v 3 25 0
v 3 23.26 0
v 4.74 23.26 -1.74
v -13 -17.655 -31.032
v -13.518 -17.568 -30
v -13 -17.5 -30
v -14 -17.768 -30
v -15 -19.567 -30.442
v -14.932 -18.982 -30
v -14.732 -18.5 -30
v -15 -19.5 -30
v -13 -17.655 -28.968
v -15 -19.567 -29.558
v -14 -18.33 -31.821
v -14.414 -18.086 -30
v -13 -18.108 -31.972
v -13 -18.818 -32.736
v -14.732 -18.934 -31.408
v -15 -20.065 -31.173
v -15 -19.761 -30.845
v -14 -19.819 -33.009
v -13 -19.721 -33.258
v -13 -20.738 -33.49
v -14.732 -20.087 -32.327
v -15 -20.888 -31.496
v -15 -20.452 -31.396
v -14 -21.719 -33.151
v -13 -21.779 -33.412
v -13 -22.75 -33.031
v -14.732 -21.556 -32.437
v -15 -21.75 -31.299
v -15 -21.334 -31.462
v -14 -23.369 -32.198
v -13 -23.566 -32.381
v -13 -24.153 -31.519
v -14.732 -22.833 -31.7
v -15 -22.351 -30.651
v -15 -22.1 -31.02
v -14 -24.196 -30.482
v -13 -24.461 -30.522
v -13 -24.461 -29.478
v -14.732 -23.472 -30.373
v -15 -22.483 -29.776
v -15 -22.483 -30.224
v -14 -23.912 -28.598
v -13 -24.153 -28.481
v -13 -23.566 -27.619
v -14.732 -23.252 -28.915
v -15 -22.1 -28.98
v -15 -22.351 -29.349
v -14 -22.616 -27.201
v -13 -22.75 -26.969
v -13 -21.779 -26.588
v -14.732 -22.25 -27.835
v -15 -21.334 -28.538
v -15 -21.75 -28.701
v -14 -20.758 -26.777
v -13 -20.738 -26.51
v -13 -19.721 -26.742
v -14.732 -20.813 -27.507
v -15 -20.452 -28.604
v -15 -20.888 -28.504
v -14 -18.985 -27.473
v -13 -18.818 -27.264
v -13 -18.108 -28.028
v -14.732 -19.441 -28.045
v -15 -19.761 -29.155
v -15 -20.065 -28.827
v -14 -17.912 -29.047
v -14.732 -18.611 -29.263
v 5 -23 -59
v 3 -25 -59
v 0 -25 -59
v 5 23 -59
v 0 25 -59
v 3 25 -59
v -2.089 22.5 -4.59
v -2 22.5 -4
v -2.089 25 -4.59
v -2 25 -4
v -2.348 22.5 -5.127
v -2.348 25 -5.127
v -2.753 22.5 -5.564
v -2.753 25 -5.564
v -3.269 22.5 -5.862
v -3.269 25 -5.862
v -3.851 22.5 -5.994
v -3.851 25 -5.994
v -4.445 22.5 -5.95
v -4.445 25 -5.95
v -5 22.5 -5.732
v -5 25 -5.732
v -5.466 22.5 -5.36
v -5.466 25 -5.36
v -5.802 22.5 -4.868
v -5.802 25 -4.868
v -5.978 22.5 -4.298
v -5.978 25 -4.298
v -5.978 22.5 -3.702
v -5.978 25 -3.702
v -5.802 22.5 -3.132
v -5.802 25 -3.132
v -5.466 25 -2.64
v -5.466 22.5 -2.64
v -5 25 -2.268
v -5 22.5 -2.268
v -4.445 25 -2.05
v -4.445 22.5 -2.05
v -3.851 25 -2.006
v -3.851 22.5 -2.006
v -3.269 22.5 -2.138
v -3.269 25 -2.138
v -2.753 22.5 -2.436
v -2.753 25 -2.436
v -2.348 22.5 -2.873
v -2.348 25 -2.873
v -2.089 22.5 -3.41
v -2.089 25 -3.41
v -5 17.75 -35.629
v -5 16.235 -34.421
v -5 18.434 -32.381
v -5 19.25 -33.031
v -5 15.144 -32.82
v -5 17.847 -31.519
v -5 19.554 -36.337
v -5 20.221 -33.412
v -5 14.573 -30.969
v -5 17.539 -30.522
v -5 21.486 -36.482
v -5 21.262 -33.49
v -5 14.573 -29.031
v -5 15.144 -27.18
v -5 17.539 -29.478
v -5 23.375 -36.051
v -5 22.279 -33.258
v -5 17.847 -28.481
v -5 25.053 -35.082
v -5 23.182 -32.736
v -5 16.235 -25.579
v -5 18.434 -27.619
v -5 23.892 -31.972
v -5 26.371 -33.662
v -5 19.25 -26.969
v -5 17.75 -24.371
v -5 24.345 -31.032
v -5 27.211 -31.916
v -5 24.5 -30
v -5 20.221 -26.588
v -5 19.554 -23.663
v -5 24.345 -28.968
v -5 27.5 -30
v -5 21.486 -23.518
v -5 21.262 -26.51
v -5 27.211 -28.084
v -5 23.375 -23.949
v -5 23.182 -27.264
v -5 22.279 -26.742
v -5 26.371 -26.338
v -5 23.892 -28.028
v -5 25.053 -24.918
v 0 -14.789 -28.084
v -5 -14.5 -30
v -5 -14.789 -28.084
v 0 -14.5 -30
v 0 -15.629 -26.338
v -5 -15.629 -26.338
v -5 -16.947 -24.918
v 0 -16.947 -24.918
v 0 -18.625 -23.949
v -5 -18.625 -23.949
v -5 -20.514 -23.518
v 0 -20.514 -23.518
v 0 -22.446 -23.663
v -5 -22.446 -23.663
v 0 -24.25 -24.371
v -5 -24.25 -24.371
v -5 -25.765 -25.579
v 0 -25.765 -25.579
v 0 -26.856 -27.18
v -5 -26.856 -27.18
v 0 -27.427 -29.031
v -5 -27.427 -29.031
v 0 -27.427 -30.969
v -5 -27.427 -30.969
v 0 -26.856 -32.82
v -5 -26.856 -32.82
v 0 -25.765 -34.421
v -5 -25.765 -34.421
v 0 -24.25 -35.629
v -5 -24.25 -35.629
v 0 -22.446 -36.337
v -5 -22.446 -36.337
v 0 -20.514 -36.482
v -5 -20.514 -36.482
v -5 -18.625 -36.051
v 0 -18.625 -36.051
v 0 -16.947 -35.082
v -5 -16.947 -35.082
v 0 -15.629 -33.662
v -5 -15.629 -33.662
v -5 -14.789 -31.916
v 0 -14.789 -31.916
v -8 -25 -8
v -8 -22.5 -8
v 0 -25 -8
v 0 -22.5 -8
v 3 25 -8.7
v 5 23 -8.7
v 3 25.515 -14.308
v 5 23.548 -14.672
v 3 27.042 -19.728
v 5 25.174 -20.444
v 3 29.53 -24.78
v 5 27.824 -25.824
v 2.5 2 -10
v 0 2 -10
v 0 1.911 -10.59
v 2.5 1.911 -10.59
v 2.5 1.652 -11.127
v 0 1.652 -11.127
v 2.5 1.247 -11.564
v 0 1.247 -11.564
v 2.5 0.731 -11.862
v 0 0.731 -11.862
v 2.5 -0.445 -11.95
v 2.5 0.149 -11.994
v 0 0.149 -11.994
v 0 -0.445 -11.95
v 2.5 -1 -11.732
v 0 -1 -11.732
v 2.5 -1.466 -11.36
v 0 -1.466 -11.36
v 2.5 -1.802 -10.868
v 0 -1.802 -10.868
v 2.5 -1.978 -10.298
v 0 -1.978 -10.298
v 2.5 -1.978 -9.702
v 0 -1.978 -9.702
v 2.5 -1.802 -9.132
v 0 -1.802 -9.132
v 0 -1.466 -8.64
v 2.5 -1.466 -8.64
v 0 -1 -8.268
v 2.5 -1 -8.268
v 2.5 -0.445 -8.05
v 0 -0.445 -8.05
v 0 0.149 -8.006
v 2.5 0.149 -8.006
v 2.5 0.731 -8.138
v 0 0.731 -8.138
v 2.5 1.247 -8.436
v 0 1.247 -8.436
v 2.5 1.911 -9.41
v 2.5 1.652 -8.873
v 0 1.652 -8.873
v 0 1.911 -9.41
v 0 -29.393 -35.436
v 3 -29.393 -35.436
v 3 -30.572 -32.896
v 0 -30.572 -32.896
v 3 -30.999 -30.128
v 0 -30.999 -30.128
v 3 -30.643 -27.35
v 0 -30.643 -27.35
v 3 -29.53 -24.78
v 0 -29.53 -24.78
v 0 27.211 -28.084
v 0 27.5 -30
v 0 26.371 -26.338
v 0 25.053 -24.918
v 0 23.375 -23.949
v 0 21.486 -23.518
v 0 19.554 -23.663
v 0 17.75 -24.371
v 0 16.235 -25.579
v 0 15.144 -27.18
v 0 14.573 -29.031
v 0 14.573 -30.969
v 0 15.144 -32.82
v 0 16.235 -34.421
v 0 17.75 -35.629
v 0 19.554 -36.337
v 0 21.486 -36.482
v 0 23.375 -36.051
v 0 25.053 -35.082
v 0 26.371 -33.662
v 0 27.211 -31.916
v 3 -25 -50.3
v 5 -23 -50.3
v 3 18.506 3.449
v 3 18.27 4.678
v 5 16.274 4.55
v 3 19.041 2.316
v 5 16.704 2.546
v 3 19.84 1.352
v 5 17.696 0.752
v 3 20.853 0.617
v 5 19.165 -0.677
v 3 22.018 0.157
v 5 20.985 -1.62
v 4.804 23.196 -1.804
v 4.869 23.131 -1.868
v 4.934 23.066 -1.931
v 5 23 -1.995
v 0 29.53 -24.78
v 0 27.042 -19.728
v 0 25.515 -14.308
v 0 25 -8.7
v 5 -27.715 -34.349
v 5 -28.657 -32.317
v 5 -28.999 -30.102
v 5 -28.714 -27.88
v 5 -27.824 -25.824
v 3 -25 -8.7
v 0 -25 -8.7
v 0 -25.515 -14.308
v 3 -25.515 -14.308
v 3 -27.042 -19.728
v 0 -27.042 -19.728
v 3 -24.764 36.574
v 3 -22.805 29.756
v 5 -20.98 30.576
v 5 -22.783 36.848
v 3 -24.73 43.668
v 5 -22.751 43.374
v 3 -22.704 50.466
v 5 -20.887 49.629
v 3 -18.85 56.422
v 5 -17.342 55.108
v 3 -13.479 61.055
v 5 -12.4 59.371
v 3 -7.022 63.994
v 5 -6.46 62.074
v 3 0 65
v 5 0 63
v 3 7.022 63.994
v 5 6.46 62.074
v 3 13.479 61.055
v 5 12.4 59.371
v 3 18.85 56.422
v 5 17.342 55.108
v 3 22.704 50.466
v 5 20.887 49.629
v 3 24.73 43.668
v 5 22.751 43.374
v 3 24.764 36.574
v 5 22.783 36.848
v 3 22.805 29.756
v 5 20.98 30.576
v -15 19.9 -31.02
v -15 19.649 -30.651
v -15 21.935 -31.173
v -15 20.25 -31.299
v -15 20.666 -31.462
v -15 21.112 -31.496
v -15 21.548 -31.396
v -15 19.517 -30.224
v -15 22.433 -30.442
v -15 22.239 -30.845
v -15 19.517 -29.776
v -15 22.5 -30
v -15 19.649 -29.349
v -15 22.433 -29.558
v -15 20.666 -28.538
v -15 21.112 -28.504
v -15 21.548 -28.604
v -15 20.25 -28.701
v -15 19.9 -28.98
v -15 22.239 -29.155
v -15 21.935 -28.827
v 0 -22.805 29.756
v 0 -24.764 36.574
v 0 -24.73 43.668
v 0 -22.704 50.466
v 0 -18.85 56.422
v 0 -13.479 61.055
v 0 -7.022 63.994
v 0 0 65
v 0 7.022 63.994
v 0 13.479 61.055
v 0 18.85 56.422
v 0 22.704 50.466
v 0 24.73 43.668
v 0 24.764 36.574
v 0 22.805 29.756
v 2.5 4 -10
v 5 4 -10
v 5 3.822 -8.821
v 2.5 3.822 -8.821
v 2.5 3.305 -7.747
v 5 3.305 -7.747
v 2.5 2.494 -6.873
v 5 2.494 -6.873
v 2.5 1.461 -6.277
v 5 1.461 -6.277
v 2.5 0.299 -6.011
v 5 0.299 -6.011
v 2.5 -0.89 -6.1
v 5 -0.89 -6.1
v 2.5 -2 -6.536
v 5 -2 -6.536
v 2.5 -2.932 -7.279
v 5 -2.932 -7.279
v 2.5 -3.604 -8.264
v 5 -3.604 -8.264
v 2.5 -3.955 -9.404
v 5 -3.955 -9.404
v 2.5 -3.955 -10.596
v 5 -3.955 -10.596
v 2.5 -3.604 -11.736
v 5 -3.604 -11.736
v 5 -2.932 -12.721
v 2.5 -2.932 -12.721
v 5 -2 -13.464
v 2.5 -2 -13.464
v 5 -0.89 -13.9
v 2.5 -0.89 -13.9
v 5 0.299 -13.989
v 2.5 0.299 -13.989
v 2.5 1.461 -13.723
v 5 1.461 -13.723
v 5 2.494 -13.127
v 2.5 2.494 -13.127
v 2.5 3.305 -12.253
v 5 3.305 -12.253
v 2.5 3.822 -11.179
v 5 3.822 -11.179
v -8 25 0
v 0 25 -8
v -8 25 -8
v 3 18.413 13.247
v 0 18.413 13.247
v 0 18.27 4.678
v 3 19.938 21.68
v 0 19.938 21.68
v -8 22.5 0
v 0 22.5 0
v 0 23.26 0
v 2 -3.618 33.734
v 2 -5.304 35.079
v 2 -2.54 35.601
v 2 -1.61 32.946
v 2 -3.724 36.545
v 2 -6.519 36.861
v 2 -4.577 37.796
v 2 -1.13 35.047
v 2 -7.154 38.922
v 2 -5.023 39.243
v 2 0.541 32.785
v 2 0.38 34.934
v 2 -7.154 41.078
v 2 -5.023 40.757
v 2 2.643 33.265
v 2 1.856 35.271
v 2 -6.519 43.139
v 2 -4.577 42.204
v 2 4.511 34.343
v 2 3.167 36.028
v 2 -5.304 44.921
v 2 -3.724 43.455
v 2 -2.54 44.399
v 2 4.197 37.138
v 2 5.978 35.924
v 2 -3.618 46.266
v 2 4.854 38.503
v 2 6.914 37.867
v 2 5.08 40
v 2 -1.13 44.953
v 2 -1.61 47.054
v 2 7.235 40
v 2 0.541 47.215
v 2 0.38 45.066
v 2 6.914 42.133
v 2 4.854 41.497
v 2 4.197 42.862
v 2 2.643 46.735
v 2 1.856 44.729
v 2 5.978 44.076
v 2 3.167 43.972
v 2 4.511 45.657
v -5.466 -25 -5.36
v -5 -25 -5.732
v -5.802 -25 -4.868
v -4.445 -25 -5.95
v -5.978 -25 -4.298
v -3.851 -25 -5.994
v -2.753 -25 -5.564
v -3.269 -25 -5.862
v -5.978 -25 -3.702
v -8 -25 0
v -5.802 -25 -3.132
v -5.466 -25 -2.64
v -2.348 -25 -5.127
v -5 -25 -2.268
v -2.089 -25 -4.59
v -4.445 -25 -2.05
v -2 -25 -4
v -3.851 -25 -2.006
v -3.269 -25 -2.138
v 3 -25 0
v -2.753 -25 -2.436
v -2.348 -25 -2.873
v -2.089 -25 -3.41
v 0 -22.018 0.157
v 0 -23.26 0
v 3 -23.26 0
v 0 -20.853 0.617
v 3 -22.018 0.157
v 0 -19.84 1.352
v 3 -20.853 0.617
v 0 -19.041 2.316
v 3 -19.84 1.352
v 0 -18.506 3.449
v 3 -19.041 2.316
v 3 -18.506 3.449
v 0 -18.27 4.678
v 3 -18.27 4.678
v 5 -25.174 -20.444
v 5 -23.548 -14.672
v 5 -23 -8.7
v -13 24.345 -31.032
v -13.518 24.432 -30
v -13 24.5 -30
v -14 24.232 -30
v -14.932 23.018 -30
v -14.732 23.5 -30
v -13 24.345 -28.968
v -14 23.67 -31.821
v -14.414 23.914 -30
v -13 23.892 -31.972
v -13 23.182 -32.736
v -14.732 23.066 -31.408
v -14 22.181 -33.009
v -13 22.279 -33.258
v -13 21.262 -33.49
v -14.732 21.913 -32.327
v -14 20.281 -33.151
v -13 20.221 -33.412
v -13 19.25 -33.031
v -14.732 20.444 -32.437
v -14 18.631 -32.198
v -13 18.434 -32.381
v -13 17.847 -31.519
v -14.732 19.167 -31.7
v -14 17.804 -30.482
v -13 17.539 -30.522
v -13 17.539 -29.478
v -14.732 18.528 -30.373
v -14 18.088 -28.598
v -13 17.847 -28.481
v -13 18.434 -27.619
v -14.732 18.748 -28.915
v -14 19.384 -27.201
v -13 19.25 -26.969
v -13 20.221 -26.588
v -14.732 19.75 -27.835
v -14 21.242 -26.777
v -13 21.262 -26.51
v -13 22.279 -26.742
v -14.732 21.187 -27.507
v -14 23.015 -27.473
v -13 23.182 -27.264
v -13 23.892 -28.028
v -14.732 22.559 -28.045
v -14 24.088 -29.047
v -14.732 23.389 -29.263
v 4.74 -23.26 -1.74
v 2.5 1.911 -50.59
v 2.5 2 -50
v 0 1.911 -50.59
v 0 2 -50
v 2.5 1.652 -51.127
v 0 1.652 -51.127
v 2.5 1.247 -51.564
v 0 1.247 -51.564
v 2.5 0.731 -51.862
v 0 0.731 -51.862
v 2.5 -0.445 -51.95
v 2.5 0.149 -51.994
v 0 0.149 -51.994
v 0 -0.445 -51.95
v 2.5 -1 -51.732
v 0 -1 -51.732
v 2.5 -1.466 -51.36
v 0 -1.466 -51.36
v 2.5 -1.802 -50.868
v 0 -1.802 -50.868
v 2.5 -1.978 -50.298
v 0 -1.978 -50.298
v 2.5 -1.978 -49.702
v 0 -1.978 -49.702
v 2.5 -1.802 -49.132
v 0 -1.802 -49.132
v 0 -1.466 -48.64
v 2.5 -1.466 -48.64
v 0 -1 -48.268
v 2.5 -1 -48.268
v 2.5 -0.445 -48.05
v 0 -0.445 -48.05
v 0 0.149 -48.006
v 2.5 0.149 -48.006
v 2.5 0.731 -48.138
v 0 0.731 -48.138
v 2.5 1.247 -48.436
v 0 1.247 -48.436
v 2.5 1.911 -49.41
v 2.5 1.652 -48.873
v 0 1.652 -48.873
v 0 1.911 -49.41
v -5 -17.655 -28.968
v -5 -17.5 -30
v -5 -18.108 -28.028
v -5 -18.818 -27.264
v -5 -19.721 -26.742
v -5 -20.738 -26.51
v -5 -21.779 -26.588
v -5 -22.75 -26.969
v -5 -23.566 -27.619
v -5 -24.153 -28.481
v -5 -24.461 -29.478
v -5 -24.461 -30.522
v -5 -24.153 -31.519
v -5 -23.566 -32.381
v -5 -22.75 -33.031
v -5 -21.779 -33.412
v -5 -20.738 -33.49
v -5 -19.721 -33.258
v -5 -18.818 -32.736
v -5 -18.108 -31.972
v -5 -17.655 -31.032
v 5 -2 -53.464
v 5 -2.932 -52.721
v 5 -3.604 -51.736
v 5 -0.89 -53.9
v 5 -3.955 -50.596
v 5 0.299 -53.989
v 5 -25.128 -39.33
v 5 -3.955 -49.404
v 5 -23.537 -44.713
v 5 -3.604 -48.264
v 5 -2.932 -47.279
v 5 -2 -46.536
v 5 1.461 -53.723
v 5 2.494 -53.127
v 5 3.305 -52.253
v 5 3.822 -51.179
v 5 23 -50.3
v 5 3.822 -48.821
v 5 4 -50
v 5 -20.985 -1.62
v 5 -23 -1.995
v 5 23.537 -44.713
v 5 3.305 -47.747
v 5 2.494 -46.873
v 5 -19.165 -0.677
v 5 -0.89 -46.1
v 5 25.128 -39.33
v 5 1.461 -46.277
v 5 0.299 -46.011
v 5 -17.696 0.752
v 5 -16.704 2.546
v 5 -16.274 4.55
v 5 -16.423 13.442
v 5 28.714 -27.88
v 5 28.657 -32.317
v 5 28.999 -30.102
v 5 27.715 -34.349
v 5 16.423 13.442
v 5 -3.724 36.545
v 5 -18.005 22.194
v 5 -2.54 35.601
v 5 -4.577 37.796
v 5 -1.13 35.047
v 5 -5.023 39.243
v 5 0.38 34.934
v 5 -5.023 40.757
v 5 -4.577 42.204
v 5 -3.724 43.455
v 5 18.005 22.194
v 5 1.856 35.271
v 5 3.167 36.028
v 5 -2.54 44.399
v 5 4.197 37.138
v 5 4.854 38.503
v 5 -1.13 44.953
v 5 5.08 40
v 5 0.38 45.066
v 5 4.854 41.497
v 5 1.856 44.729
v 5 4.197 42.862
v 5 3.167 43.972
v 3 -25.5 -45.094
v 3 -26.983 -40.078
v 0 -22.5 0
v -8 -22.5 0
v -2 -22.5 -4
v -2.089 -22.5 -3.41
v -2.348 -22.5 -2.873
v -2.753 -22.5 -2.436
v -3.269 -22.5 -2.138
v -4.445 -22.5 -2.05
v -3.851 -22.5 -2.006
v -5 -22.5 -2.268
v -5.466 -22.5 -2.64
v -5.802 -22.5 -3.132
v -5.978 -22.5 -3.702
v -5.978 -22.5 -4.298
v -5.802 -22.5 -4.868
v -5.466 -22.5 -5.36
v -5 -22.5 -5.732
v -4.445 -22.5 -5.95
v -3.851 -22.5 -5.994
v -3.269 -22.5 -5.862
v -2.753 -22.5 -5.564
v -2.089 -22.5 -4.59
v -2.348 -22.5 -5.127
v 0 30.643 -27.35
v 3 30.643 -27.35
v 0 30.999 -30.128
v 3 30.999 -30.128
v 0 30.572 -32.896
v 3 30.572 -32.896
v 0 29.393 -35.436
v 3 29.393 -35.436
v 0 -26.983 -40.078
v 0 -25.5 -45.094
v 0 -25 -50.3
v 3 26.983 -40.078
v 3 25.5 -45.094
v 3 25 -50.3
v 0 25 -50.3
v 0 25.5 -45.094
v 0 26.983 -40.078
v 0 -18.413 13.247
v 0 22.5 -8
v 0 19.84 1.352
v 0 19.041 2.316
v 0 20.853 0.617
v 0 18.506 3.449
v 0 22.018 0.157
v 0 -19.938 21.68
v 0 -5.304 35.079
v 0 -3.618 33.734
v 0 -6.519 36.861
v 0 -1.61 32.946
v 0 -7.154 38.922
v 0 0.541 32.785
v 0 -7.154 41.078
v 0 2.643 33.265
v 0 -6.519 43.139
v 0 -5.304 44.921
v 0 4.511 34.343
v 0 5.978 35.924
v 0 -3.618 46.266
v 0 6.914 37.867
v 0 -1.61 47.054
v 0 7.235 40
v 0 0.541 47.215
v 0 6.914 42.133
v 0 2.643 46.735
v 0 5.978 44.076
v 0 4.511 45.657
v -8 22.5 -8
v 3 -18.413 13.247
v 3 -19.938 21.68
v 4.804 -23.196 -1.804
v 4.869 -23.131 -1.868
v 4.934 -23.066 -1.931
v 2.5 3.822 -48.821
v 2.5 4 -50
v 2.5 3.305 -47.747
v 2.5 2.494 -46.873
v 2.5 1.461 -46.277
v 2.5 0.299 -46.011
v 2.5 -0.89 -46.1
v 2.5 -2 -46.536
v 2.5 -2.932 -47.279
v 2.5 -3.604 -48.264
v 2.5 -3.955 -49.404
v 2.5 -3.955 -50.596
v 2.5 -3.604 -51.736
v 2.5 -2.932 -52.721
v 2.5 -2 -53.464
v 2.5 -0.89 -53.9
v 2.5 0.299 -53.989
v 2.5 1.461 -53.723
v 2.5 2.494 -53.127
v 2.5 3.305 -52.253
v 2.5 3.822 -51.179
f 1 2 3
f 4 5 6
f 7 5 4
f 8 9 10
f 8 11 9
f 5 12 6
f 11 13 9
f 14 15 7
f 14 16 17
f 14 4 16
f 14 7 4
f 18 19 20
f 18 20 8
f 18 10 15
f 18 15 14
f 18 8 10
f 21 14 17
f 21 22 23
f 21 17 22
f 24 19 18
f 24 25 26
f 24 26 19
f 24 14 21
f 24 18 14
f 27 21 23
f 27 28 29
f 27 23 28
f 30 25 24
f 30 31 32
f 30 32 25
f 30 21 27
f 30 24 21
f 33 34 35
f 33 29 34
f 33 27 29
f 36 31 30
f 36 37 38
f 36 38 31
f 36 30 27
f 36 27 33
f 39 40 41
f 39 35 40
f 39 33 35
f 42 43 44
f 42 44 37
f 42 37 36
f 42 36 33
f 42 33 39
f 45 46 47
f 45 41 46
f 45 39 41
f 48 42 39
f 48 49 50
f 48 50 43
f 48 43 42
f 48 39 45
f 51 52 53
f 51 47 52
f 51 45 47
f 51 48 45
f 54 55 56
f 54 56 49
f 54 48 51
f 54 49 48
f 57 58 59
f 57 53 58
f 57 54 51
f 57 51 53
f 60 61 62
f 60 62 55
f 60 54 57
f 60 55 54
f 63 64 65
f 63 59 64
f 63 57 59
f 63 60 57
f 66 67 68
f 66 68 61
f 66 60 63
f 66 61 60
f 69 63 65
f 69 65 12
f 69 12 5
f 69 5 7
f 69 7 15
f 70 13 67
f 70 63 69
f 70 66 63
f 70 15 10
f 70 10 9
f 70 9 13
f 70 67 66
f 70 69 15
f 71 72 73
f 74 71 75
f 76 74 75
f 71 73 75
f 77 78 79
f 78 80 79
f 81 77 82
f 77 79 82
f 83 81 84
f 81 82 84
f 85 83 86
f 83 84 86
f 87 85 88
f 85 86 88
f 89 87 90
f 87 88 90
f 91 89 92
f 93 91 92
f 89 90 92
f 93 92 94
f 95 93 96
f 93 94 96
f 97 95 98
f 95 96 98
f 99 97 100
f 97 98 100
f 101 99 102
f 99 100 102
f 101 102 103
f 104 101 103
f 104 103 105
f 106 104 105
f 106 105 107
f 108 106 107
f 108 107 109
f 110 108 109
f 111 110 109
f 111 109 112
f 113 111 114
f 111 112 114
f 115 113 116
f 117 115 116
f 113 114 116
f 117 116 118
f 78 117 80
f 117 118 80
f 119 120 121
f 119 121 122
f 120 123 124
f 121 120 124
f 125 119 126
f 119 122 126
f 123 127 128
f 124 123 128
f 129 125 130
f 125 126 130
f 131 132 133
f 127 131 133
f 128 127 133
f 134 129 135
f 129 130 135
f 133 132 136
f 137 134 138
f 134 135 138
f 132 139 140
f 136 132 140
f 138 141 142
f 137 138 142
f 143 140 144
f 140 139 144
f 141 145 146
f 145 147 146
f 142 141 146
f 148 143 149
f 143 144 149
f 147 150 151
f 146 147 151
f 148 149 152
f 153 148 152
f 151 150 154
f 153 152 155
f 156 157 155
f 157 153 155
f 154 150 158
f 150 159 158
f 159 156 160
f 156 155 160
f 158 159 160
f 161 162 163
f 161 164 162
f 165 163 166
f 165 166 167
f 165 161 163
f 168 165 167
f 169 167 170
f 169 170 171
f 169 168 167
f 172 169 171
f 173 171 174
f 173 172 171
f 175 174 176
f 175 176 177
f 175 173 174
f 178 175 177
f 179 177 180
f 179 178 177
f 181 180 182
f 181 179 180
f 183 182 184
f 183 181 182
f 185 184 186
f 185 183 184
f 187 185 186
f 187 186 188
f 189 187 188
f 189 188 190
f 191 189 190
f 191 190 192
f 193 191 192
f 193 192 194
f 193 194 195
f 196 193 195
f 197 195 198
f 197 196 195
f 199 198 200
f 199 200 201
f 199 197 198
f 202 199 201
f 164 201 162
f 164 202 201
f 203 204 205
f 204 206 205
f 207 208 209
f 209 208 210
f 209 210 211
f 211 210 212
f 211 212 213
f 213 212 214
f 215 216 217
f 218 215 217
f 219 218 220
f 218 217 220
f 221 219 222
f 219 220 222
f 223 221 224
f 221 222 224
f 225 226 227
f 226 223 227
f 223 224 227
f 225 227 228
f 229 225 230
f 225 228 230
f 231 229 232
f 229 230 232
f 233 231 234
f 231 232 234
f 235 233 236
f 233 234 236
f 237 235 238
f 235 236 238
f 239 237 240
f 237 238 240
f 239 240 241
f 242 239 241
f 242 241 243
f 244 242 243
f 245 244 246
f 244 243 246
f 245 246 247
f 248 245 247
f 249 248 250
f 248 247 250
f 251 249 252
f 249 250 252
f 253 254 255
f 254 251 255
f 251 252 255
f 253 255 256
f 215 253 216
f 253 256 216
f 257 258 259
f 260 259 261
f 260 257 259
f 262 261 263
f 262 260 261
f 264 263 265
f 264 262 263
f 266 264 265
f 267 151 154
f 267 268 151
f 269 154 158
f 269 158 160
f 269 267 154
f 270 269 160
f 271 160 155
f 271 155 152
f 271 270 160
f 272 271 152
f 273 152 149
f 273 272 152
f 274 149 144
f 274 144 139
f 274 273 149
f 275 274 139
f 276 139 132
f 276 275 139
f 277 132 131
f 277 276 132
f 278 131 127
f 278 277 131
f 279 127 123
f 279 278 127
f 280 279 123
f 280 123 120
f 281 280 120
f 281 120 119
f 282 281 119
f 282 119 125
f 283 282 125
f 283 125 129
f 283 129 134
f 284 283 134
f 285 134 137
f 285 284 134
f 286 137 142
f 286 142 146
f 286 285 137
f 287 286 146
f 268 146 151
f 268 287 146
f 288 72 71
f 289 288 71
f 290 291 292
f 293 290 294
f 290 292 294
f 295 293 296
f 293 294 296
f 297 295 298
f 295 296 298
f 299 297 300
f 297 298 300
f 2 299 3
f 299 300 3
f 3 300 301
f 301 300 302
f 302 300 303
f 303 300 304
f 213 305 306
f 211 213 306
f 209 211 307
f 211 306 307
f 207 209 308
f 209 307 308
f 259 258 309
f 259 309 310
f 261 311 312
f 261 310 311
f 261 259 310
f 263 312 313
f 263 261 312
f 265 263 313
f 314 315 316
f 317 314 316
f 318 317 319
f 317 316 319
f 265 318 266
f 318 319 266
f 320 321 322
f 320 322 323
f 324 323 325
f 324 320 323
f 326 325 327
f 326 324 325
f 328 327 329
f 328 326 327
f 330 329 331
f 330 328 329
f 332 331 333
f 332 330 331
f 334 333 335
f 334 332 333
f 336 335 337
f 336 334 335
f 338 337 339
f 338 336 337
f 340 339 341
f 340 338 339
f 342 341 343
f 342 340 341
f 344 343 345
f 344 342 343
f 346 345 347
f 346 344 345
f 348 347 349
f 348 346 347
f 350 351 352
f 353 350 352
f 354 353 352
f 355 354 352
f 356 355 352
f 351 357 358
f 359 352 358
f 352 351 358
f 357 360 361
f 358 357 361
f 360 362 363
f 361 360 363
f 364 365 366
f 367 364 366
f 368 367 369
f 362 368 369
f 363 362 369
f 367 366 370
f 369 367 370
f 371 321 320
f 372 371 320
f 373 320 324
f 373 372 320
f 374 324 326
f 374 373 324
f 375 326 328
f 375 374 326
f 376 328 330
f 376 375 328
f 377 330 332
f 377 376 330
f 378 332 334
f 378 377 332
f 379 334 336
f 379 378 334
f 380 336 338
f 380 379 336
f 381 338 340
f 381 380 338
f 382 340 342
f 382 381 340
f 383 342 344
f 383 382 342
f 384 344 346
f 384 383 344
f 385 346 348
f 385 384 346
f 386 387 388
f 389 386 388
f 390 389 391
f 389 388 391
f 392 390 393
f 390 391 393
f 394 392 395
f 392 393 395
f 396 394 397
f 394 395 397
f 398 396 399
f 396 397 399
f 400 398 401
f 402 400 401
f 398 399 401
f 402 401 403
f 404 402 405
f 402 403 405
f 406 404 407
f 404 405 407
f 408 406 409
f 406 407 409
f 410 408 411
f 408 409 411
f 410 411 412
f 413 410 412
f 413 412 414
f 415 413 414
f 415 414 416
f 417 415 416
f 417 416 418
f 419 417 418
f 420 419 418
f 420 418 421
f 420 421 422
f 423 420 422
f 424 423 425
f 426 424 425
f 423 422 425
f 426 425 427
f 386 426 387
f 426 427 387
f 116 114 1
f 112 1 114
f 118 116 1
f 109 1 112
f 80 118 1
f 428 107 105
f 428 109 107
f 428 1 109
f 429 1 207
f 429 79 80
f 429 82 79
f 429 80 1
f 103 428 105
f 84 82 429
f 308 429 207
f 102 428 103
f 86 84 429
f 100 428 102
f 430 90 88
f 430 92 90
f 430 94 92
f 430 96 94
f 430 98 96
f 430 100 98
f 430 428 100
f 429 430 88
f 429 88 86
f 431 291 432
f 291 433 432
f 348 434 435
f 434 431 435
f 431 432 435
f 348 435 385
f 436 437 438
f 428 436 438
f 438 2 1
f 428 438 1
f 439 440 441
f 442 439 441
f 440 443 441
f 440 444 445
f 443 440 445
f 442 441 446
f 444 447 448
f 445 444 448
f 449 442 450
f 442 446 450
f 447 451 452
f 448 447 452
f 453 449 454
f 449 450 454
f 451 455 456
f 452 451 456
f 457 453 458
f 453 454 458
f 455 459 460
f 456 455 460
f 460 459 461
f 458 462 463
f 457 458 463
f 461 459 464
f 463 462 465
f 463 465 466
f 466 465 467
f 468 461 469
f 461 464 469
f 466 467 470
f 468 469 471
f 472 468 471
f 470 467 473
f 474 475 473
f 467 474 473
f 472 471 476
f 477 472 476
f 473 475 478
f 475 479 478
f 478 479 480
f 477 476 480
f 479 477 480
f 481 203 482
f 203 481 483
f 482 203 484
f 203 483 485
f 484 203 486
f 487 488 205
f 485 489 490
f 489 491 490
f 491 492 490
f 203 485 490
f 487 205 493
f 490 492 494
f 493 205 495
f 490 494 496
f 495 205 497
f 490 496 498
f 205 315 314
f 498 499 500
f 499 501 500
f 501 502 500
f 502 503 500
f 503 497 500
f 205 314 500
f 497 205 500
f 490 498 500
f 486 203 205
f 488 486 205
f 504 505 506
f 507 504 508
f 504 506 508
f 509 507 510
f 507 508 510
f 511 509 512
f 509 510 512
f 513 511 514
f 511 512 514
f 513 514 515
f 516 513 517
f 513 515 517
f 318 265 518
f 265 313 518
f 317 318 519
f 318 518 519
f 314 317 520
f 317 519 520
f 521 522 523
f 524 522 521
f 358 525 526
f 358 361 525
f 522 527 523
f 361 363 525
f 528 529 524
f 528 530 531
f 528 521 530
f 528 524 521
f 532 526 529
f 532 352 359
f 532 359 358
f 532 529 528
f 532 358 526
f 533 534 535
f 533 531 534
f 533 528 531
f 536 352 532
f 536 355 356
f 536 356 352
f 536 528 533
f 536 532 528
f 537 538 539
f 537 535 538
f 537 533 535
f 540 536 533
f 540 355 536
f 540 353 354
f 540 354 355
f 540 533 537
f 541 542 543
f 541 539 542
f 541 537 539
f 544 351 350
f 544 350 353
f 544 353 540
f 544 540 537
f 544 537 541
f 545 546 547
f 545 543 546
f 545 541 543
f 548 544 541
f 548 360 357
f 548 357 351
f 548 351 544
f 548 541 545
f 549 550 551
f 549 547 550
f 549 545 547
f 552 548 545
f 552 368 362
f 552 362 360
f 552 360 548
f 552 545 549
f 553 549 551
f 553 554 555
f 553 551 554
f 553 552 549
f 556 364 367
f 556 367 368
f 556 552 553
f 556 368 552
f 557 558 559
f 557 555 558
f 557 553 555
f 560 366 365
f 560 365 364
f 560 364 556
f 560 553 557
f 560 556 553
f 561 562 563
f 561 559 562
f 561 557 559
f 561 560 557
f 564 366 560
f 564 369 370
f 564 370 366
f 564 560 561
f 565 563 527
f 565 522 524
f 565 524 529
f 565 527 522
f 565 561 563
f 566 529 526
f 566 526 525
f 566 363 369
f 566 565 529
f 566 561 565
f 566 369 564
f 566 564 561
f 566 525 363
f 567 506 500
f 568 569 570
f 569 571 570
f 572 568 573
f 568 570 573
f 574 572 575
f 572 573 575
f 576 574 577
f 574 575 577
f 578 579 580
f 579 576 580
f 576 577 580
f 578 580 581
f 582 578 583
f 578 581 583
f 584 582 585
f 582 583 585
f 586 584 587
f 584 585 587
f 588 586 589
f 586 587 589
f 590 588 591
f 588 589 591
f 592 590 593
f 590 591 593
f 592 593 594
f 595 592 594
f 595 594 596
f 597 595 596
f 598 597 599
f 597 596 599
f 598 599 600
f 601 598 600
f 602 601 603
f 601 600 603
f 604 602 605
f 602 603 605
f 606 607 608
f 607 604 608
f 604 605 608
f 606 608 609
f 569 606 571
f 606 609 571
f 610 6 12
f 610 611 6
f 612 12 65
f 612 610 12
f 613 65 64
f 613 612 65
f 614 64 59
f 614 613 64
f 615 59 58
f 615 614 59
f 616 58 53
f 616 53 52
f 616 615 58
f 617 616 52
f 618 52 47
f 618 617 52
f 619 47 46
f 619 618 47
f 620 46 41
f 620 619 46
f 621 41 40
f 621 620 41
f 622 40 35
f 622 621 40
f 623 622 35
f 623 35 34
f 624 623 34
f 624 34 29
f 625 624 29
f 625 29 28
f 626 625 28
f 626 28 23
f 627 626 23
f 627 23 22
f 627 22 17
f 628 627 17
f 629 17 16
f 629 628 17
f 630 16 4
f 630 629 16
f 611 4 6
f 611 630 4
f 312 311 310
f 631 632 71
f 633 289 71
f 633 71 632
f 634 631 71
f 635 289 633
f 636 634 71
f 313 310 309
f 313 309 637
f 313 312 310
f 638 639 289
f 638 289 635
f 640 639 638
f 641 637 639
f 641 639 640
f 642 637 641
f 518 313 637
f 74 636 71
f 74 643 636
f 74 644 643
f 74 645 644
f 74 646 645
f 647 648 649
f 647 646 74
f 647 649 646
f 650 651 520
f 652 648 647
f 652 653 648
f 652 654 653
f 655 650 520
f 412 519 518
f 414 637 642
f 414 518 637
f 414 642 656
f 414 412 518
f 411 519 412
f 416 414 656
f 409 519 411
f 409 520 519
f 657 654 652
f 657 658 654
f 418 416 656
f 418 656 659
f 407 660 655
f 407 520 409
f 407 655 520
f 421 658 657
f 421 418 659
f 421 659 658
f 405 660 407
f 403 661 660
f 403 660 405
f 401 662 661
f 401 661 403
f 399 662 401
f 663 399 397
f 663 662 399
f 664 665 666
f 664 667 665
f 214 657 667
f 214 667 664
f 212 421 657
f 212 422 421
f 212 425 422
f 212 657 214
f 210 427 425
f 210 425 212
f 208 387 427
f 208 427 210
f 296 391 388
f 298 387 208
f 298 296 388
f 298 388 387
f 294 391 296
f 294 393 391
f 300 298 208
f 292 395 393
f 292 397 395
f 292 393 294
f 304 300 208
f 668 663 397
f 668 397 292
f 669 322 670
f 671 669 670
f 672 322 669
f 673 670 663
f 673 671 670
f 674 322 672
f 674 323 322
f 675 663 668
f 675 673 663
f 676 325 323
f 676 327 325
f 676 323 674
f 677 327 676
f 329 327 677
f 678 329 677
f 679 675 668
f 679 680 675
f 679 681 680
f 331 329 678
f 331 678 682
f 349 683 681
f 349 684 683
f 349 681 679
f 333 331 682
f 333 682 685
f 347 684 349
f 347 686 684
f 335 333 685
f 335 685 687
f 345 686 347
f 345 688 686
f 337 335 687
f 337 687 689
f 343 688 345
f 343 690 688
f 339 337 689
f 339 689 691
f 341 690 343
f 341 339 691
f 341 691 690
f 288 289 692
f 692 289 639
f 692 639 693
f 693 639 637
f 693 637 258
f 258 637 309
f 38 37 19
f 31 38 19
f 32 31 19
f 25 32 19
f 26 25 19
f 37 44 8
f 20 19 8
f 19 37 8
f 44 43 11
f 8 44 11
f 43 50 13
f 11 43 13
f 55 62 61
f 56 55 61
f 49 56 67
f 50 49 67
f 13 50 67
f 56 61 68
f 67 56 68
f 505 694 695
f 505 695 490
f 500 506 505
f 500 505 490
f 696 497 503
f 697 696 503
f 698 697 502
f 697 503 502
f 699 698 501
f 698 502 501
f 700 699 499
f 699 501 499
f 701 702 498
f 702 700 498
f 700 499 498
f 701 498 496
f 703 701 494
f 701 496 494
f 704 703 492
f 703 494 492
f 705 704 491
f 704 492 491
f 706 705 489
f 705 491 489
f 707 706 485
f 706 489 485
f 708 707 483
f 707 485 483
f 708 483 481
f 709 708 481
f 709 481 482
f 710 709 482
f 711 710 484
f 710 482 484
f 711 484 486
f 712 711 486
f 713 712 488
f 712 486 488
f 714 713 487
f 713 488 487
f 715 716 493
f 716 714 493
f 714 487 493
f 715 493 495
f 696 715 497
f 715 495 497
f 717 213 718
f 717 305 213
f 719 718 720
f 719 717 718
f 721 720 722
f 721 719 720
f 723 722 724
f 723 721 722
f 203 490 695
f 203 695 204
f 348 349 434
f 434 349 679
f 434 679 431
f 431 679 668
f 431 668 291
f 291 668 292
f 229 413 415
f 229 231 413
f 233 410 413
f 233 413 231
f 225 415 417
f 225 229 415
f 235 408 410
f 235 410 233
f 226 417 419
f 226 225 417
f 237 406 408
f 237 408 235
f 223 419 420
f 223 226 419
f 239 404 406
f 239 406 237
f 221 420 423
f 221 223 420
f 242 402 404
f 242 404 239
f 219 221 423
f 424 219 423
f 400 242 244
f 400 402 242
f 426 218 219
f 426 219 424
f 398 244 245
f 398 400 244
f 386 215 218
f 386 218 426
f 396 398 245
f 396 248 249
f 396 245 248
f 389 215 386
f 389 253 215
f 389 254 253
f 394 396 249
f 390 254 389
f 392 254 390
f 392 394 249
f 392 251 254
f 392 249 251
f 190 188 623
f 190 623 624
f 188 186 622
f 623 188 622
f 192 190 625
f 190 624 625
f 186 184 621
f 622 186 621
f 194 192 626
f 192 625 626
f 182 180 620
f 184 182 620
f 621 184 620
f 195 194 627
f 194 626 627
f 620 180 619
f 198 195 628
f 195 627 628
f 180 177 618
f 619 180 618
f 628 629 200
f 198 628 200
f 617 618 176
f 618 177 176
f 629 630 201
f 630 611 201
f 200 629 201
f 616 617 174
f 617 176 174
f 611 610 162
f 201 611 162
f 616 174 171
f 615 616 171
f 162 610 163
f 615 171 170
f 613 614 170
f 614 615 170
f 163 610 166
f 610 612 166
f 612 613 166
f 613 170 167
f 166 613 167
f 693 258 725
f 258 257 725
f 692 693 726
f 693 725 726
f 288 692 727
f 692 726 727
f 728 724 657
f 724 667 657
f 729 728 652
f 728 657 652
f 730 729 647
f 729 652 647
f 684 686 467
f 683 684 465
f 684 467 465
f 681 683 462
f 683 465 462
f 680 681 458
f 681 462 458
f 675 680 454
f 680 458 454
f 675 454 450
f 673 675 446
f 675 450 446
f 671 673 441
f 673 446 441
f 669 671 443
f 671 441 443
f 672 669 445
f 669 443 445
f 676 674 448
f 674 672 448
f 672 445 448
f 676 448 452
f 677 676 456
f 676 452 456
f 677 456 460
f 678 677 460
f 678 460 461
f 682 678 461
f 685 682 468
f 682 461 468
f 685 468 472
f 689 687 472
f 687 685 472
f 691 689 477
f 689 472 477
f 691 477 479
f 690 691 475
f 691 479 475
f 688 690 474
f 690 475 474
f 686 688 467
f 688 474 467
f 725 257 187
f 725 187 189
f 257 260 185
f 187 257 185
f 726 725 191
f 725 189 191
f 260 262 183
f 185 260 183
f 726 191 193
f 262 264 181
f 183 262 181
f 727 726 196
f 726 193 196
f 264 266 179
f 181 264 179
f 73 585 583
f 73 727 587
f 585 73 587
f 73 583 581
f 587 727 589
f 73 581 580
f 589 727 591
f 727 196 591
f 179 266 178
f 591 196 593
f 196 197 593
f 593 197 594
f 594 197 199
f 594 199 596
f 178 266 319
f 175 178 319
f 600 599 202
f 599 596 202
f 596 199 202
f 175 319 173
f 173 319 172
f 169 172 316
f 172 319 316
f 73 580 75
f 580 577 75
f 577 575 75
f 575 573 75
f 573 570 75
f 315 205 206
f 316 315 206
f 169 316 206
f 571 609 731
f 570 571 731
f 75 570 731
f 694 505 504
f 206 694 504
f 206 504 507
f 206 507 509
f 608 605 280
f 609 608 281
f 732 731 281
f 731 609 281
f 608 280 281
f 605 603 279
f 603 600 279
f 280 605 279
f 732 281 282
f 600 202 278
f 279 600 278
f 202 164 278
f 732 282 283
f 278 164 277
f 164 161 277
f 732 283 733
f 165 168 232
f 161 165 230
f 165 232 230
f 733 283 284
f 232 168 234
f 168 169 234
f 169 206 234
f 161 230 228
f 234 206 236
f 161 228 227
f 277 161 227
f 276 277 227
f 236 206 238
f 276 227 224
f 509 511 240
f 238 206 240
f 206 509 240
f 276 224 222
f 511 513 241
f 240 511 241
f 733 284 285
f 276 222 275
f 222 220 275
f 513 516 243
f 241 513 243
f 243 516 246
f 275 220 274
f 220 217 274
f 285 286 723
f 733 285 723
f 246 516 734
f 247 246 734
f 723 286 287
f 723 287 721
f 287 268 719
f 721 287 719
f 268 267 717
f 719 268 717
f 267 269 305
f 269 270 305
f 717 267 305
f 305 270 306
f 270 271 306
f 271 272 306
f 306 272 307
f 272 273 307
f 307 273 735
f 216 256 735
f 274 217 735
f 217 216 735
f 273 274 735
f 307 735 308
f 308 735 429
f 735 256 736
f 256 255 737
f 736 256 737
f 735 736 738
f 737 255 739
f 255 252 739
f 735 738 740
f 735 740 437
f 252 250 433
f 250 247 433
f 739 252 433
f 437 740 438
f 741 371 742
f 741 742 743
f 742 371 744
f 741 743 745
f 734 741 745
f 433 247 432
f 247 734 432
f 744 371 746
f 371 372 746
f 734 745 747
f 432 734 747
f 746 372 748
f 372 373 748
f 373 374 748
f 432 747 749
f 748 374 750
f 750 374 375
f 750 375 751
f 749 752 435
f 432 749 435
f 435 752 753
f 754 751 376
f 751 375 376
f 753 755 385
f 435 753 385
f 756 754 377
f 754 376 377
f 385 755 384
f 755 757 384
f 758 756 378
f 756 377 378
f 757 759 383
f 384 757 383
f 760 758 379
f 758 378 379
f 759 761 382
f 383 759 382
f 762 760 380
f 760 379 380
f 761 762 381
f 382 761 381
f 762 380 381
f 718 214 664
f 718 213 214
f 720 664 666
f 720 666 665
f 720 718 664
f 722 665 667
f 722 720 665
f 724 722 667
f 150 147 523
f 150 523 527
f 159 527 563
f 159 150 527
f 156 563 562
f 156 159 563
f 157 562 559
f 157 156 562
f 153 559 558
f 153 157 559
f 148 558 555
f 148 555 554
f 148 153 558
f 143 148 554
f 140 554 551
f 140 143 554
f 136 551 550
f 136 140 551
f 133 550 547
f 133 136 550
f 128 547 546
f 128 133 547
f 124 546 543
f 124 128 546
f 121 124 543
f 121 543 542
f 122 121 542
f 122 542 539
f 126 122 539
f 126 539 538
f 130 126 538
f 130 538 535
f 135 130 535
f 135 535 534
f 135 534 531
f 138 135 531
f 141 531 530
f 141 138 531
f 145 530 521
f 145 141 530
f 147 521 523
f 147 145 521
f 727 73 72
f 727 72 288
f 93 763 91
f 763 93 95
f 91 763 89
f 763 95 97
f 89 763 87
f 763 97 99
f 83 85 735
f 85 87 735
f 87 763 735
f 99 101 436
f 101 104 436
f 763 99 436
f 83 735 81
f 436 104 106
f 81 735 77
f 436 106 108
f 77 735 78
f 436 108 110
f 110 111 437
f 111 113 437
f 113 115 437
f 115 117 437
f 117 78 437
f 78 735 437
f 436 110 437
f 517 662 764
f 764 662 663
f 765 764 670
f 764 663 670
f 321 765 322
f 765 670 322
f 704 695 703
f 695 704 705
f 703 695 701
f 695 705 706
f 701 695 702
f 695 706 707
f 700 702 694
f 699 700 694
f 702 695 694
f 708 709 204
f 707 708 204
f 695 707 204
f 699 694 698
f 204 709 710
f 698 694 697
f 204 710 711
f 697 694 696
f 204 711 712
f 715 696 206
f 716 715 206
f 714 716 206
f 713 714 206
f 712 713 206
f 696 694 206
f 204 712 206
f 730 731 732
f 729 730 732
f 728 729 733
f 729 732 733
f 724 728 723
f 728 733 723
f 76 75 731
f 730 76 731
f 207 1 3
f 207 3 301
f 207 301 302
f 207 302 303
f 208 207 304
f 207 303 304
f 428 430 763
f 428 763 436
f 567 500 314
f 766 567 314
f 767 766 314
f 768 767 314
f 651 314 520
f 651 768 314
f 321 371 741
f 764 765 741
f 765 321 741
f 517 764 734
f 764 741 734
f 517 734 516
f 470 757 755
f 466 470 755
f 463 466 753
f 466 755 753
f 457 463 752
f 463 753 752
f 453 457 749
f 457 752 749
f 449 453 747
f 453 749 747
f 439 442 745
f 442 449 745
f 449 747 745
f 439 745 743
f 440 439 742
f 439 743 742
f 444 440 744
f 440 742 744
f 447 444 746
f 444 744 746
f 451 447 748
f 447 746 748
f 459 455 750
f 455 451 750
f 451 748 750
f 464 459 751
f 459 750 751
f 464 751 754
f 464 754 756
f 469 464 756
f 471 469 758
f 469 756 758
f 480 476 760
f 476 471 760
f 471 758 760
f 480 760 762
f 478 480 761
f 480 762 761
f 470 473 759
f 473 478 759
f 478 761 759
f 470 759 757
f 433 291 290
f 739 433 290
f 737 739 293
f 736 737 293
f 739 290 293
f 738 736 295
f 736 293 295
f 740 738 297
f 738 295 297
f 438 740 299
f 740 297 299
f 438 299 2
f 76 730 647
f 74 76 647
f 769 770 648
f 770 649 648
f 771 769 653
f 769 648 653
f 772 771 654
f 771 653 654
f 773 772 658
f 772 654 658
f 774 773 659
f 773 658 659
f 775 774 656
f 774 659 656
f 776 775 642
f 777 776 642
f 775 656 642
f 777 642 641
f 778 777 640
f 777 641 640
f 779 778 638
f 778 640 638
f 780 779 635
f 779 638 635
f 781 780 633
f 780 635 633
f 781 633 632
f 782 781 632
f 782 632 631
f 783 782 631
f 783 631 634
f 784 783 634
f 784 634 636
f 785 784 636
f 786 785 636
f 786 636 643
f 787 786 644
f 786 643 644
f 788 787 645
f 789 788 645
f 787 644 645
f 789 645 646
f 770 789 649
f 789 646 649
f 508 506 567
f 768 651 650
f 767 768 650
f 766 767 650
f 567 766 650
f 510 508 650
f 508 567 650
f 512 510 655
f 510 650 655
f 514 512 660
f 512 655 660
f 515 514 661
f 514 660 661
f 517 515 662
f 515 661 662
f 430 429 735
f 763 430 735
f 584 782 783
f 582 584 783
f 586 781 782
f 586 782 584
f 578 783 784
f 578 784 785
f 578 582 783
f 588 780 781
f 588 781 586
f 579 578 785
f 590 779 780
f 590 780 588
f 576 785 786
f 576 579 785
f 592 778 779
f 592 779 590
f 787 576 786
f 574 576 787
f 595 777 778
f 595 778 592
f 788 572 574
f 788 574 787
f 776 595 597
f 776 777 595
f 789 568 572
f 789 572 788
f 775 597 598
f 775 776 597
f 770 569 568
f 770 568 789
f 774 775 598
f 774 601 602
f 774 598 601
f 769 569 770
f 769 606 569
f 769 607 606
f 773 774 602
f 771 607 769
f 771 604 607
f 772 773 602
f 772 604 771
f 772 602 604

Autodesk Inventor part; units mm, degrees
ref_plane "YZ Plane" through (0, 0, 0) normal (1, 0, 0) x (0, 1, 0)
ref_plane "XZ Plane" through (0, 0, 0) normal (0, 1, 0) x (-1, 0, 0)
ref_plane "XY Plane" through (0, 0, 0) normal (0, 0, 1) x (1, 0, 0)
sketch "Sketch1" plane through (0, 0, 0) normal (1, 0, 0) x (0, 1, 0)
  line L0 (0, 0) -> (0, -10) construction
  line L1 (0, -10) -> (0, -50) construction
  circle A0 centre (0, -10) radius 2
  circle A1 centre (0, -50) radius 2
  line L2 (10, 0) -> (10, -59)
  line L3 (10, -59) -> (0, -59)
  line L4 (0, -59) -> (-10, -59)
  line L5 (-10, -59) -> (-10, 0)
  line L6 (0, 0) -> (10, 0)
  line L7 (0, 0) -> (-10, 0)
  line L8 (0, -50) -> (0, -59) construction
  circle A2 centre (0, 40) radius 25
  line L9 (10, 0) -> (10, 10)
  line L10 (10, 10) -> (-10, 10)
  line L11 (-10, 10) -> (-10, 0)
  arc A3 (22.804878, 29.756098) -> (10, -30) centre (155.833333, -30) ccw
  arc A4 (-10, -30) -> (-22.804878, 29.756098) centre (-155.833333, -30) ccw
  line L12 (0, -30) -> (21, -30) construction
  line L13 (0, -30) -> (-21, -30) construction
  circle A5 centre (21, -30) radius 3.5
  circle A6 centre (-21, -30) radius 3.5
  circle A7 centre (21, -30) radius 10
  circle A8 centre (-21, -30) radius 10
  circle A9 centre (21, -30) radius 6.5
  circle A10 centre (-21, -30) radius 6.5
  line L14 (-10, -59) -> (-25, -59)
  line L15 (10, -59) -> (25, -59)
  arc A11 (-28.958574, -23.94516) -> (-22.804878, 29.756098) centre (-71.055556, 8.081996) ccw
  arc A12 (22.804878, 29.756098) -> (28.958574, -23.94516) centre (71.055556, 8.081996) ccw
  line L16 (0, 0) -> (15, 0)
  line L17 (10, 0) -> (25, 0)
  line L18 (25, -59) -> (25, -50.3)
  arc A13 (29.39318, -35.436408) -> (25, -50.3) centre (52.340833, -50.3) ccw
  line L19 (25, 0) -> (25, -8.7)
  arc A14 (25, -8.7) -> (29.529682, -24.780371) centre (55.8075, -8.7) ccw
  line L20 (-10, 0) -> (-25, 0)
  line L21 (-25, -59) -> (-25, -50.3)
  arc A15 (-25, -50.3) -> (-29.39318, -35.436408) centre (-52.340833, -50.3) ccw
  line L22 (-25, 0) -> (-25, -8.7)
  arc A16 (-29.529682, -24.780371) -> (-25, -8.7) centre (-55.8075, -8.7) ccw
  circle A17 centre (0, -50) radius 4
  circle A18 centre (0, -10) radius 4
  circle A19 centre (0, 40) radius 7.235
  circle A20 centre (0, 40) radius 5.08
  point P0 (-10, -30)
  point P1 (10, -30)
  point P2 (23.824594, -39.592793)
  point P3 (10, -63.33599)
  point P4 (-30.230769, -33.846154)
  point P5 (28.958574, -23.94516)
  point P6 (22.804878, 29.756098)
  point P7 (30.230769, -26.153846)
  point P8 (18.78151, 0)
  point P9 (-18.78151, 0)
  point P10 (-13.119069, 0)
  point P11 (-29.39318, -35.436408)
  dimension "d0" = 4
  dimension "d1" = 4
  dimension "d2" = 40
  dimension "d3" = 10
  dimension "d5" = 9
  dimension "d7" = 10
  dimension "d8" = 10
  dimension "d9" = 50
  dimension "d12" = 30
  dimension "d13" = 10
  dimension "d14" = 20
  dimension "d30" = 21
  dimension "d31" = 7
  dimension "d32" = 7
  dimension "d33" = 20
  dimension "d34" = 20
  dimension "d38" = 3
  dimension "d48" = 15
  dimension "d55" = 15
  dimension "d56" = 8.7
  dimension "d57" = 8.7
  dimension "d58" = 15
  dimension "d134" = 8
  dimension "d135" = 8
  dimension "d138" = 14.47
  dimension "d157" = 10.16
extrude "Extrusion1" add sketch "Sketch1" along normal blind 5 contours L16 A3 L2 | L2 L3 L4 L5 L7 L6 | L6 L7 L11 L10 L9 | L9 L10 L11 L20 A4 A2 A3 L16 | A3 L16 L17 A12 A7 A13 L18 L15 L2 | A3 A12 L17 L16 | L5 A4 L20 | A2 | L5 L14 L21 A15 A8 A11 L20 A4 | L20 A11 A4 | L17 L19 A14 A7 A12 | A11 A8 A16 L22 L20 | A7 | A8 | A5 | A6 | A9 | A10 | A17 | A18 | A19 | A20
fillet "Face Fillet1" radius 5 1 edges at (2.5, -18.7815, 0)
fillet "Face Fillet2" radius 5 1 edges at (2.5, 18.7815, 0)
extrude "Extrusion16" cut sketch "Sketch1" along normal up to surface (5 mm away) contours A20
extrude "Extrusion17" cut sketch "Sketch1" along normal blind 2 from surface at 0 contours A19 | A20
extrude "Extrusion11" cut sketch "Sketch1" against normal blind 2.5 from surface at 5 contours A17 | A18
extrude "Extrusion19" add sketch "Sketch1" against normal blind 15 contours A5 | A6
extrude "Extrusion20" add sketch "Sketch1" against normal blind 5 contours A9 | A10
fillet "Fillet4" radius 2 2 edges at (-15, 17.5, -30) (-15, -24.5, -30)
chamfer "Chamfer2" distance 2 angle 45 17 edges at (5, 0, 65) (5, -19.0046, 17.4944) (5, -19.8398, 1.3525) (5, -24.1298, 0) (5, 19.0046, 17.4944) (5, 19.8398, 1.3525) (5, 24.1298, 0) (5, 25, -4.35) (5, 26.154, -17.0531) (5, 30.9992, -30.1281) (5, 26.1213, -42.5504) (5, 25, -54.65) (5, -26.154, -17.0531) (5, -30.9992, -30.1281) (5, -26.1213, -42.5504) (5, -25, -54.65) (5, -25, -4.35)
sketch "Sketch15" plane through (0, 0, 0) normal (-1, 0, 0) x (0, 0, 1)
  line L0 (0, 25) -> (0, 23.259692)
  line L1 (0, 25) -> (-8, 25)
  line L2 (-8, 25) -> (-8, 22.5)
  line L3 (-8, 22.5) -> (0, 22.5)
  line L4 (0, 22.5) -> (0, 25)
  point P0 (0, 0)
  dimension "d175" = 8
  dimension "d176" = 2.5
extrude "Extrusion21" add sketch "Sketch15" along normal blind 8
sketch "Sketch16" plane through (0, 25, -8.7) normal (0, 1, 0) x (1, 0, 0)
  circle A0 centre (-4, -4.7) radius 2
  line L0 (-8, -8.7) -> (-8, -0.7) projected
  line L1 (-8, -8.7) -> (3, -8.7) projected
  point P0 (0, -8.7)
  dimension "d179" = 4
  dimension "d180" = 4
  dimension "d181" = 4
extrude "Extrusion22" cut sketch "Sketch16" against normal up to surface (2.5 mm away)
mirror "Mirror2" about plane through (0, 0, 0) normal (0, 1, 0) of "Extrusion22", "Extrusion21"
equation "\"d0\" = M4_HOLE_D"
equation "\"d1\" = d0"
equation "\"d14\" = 0.5 * d2"
equation "\"d32\" = d31"
equation "\"d34\" = d33"
equation "\"M4_HOLE_D\" = 4"
equation "\"M3_HOLE_D\" = 3"
equation "\"d88\" = 3"
properties part number "bearing_arm_3DPrint"
